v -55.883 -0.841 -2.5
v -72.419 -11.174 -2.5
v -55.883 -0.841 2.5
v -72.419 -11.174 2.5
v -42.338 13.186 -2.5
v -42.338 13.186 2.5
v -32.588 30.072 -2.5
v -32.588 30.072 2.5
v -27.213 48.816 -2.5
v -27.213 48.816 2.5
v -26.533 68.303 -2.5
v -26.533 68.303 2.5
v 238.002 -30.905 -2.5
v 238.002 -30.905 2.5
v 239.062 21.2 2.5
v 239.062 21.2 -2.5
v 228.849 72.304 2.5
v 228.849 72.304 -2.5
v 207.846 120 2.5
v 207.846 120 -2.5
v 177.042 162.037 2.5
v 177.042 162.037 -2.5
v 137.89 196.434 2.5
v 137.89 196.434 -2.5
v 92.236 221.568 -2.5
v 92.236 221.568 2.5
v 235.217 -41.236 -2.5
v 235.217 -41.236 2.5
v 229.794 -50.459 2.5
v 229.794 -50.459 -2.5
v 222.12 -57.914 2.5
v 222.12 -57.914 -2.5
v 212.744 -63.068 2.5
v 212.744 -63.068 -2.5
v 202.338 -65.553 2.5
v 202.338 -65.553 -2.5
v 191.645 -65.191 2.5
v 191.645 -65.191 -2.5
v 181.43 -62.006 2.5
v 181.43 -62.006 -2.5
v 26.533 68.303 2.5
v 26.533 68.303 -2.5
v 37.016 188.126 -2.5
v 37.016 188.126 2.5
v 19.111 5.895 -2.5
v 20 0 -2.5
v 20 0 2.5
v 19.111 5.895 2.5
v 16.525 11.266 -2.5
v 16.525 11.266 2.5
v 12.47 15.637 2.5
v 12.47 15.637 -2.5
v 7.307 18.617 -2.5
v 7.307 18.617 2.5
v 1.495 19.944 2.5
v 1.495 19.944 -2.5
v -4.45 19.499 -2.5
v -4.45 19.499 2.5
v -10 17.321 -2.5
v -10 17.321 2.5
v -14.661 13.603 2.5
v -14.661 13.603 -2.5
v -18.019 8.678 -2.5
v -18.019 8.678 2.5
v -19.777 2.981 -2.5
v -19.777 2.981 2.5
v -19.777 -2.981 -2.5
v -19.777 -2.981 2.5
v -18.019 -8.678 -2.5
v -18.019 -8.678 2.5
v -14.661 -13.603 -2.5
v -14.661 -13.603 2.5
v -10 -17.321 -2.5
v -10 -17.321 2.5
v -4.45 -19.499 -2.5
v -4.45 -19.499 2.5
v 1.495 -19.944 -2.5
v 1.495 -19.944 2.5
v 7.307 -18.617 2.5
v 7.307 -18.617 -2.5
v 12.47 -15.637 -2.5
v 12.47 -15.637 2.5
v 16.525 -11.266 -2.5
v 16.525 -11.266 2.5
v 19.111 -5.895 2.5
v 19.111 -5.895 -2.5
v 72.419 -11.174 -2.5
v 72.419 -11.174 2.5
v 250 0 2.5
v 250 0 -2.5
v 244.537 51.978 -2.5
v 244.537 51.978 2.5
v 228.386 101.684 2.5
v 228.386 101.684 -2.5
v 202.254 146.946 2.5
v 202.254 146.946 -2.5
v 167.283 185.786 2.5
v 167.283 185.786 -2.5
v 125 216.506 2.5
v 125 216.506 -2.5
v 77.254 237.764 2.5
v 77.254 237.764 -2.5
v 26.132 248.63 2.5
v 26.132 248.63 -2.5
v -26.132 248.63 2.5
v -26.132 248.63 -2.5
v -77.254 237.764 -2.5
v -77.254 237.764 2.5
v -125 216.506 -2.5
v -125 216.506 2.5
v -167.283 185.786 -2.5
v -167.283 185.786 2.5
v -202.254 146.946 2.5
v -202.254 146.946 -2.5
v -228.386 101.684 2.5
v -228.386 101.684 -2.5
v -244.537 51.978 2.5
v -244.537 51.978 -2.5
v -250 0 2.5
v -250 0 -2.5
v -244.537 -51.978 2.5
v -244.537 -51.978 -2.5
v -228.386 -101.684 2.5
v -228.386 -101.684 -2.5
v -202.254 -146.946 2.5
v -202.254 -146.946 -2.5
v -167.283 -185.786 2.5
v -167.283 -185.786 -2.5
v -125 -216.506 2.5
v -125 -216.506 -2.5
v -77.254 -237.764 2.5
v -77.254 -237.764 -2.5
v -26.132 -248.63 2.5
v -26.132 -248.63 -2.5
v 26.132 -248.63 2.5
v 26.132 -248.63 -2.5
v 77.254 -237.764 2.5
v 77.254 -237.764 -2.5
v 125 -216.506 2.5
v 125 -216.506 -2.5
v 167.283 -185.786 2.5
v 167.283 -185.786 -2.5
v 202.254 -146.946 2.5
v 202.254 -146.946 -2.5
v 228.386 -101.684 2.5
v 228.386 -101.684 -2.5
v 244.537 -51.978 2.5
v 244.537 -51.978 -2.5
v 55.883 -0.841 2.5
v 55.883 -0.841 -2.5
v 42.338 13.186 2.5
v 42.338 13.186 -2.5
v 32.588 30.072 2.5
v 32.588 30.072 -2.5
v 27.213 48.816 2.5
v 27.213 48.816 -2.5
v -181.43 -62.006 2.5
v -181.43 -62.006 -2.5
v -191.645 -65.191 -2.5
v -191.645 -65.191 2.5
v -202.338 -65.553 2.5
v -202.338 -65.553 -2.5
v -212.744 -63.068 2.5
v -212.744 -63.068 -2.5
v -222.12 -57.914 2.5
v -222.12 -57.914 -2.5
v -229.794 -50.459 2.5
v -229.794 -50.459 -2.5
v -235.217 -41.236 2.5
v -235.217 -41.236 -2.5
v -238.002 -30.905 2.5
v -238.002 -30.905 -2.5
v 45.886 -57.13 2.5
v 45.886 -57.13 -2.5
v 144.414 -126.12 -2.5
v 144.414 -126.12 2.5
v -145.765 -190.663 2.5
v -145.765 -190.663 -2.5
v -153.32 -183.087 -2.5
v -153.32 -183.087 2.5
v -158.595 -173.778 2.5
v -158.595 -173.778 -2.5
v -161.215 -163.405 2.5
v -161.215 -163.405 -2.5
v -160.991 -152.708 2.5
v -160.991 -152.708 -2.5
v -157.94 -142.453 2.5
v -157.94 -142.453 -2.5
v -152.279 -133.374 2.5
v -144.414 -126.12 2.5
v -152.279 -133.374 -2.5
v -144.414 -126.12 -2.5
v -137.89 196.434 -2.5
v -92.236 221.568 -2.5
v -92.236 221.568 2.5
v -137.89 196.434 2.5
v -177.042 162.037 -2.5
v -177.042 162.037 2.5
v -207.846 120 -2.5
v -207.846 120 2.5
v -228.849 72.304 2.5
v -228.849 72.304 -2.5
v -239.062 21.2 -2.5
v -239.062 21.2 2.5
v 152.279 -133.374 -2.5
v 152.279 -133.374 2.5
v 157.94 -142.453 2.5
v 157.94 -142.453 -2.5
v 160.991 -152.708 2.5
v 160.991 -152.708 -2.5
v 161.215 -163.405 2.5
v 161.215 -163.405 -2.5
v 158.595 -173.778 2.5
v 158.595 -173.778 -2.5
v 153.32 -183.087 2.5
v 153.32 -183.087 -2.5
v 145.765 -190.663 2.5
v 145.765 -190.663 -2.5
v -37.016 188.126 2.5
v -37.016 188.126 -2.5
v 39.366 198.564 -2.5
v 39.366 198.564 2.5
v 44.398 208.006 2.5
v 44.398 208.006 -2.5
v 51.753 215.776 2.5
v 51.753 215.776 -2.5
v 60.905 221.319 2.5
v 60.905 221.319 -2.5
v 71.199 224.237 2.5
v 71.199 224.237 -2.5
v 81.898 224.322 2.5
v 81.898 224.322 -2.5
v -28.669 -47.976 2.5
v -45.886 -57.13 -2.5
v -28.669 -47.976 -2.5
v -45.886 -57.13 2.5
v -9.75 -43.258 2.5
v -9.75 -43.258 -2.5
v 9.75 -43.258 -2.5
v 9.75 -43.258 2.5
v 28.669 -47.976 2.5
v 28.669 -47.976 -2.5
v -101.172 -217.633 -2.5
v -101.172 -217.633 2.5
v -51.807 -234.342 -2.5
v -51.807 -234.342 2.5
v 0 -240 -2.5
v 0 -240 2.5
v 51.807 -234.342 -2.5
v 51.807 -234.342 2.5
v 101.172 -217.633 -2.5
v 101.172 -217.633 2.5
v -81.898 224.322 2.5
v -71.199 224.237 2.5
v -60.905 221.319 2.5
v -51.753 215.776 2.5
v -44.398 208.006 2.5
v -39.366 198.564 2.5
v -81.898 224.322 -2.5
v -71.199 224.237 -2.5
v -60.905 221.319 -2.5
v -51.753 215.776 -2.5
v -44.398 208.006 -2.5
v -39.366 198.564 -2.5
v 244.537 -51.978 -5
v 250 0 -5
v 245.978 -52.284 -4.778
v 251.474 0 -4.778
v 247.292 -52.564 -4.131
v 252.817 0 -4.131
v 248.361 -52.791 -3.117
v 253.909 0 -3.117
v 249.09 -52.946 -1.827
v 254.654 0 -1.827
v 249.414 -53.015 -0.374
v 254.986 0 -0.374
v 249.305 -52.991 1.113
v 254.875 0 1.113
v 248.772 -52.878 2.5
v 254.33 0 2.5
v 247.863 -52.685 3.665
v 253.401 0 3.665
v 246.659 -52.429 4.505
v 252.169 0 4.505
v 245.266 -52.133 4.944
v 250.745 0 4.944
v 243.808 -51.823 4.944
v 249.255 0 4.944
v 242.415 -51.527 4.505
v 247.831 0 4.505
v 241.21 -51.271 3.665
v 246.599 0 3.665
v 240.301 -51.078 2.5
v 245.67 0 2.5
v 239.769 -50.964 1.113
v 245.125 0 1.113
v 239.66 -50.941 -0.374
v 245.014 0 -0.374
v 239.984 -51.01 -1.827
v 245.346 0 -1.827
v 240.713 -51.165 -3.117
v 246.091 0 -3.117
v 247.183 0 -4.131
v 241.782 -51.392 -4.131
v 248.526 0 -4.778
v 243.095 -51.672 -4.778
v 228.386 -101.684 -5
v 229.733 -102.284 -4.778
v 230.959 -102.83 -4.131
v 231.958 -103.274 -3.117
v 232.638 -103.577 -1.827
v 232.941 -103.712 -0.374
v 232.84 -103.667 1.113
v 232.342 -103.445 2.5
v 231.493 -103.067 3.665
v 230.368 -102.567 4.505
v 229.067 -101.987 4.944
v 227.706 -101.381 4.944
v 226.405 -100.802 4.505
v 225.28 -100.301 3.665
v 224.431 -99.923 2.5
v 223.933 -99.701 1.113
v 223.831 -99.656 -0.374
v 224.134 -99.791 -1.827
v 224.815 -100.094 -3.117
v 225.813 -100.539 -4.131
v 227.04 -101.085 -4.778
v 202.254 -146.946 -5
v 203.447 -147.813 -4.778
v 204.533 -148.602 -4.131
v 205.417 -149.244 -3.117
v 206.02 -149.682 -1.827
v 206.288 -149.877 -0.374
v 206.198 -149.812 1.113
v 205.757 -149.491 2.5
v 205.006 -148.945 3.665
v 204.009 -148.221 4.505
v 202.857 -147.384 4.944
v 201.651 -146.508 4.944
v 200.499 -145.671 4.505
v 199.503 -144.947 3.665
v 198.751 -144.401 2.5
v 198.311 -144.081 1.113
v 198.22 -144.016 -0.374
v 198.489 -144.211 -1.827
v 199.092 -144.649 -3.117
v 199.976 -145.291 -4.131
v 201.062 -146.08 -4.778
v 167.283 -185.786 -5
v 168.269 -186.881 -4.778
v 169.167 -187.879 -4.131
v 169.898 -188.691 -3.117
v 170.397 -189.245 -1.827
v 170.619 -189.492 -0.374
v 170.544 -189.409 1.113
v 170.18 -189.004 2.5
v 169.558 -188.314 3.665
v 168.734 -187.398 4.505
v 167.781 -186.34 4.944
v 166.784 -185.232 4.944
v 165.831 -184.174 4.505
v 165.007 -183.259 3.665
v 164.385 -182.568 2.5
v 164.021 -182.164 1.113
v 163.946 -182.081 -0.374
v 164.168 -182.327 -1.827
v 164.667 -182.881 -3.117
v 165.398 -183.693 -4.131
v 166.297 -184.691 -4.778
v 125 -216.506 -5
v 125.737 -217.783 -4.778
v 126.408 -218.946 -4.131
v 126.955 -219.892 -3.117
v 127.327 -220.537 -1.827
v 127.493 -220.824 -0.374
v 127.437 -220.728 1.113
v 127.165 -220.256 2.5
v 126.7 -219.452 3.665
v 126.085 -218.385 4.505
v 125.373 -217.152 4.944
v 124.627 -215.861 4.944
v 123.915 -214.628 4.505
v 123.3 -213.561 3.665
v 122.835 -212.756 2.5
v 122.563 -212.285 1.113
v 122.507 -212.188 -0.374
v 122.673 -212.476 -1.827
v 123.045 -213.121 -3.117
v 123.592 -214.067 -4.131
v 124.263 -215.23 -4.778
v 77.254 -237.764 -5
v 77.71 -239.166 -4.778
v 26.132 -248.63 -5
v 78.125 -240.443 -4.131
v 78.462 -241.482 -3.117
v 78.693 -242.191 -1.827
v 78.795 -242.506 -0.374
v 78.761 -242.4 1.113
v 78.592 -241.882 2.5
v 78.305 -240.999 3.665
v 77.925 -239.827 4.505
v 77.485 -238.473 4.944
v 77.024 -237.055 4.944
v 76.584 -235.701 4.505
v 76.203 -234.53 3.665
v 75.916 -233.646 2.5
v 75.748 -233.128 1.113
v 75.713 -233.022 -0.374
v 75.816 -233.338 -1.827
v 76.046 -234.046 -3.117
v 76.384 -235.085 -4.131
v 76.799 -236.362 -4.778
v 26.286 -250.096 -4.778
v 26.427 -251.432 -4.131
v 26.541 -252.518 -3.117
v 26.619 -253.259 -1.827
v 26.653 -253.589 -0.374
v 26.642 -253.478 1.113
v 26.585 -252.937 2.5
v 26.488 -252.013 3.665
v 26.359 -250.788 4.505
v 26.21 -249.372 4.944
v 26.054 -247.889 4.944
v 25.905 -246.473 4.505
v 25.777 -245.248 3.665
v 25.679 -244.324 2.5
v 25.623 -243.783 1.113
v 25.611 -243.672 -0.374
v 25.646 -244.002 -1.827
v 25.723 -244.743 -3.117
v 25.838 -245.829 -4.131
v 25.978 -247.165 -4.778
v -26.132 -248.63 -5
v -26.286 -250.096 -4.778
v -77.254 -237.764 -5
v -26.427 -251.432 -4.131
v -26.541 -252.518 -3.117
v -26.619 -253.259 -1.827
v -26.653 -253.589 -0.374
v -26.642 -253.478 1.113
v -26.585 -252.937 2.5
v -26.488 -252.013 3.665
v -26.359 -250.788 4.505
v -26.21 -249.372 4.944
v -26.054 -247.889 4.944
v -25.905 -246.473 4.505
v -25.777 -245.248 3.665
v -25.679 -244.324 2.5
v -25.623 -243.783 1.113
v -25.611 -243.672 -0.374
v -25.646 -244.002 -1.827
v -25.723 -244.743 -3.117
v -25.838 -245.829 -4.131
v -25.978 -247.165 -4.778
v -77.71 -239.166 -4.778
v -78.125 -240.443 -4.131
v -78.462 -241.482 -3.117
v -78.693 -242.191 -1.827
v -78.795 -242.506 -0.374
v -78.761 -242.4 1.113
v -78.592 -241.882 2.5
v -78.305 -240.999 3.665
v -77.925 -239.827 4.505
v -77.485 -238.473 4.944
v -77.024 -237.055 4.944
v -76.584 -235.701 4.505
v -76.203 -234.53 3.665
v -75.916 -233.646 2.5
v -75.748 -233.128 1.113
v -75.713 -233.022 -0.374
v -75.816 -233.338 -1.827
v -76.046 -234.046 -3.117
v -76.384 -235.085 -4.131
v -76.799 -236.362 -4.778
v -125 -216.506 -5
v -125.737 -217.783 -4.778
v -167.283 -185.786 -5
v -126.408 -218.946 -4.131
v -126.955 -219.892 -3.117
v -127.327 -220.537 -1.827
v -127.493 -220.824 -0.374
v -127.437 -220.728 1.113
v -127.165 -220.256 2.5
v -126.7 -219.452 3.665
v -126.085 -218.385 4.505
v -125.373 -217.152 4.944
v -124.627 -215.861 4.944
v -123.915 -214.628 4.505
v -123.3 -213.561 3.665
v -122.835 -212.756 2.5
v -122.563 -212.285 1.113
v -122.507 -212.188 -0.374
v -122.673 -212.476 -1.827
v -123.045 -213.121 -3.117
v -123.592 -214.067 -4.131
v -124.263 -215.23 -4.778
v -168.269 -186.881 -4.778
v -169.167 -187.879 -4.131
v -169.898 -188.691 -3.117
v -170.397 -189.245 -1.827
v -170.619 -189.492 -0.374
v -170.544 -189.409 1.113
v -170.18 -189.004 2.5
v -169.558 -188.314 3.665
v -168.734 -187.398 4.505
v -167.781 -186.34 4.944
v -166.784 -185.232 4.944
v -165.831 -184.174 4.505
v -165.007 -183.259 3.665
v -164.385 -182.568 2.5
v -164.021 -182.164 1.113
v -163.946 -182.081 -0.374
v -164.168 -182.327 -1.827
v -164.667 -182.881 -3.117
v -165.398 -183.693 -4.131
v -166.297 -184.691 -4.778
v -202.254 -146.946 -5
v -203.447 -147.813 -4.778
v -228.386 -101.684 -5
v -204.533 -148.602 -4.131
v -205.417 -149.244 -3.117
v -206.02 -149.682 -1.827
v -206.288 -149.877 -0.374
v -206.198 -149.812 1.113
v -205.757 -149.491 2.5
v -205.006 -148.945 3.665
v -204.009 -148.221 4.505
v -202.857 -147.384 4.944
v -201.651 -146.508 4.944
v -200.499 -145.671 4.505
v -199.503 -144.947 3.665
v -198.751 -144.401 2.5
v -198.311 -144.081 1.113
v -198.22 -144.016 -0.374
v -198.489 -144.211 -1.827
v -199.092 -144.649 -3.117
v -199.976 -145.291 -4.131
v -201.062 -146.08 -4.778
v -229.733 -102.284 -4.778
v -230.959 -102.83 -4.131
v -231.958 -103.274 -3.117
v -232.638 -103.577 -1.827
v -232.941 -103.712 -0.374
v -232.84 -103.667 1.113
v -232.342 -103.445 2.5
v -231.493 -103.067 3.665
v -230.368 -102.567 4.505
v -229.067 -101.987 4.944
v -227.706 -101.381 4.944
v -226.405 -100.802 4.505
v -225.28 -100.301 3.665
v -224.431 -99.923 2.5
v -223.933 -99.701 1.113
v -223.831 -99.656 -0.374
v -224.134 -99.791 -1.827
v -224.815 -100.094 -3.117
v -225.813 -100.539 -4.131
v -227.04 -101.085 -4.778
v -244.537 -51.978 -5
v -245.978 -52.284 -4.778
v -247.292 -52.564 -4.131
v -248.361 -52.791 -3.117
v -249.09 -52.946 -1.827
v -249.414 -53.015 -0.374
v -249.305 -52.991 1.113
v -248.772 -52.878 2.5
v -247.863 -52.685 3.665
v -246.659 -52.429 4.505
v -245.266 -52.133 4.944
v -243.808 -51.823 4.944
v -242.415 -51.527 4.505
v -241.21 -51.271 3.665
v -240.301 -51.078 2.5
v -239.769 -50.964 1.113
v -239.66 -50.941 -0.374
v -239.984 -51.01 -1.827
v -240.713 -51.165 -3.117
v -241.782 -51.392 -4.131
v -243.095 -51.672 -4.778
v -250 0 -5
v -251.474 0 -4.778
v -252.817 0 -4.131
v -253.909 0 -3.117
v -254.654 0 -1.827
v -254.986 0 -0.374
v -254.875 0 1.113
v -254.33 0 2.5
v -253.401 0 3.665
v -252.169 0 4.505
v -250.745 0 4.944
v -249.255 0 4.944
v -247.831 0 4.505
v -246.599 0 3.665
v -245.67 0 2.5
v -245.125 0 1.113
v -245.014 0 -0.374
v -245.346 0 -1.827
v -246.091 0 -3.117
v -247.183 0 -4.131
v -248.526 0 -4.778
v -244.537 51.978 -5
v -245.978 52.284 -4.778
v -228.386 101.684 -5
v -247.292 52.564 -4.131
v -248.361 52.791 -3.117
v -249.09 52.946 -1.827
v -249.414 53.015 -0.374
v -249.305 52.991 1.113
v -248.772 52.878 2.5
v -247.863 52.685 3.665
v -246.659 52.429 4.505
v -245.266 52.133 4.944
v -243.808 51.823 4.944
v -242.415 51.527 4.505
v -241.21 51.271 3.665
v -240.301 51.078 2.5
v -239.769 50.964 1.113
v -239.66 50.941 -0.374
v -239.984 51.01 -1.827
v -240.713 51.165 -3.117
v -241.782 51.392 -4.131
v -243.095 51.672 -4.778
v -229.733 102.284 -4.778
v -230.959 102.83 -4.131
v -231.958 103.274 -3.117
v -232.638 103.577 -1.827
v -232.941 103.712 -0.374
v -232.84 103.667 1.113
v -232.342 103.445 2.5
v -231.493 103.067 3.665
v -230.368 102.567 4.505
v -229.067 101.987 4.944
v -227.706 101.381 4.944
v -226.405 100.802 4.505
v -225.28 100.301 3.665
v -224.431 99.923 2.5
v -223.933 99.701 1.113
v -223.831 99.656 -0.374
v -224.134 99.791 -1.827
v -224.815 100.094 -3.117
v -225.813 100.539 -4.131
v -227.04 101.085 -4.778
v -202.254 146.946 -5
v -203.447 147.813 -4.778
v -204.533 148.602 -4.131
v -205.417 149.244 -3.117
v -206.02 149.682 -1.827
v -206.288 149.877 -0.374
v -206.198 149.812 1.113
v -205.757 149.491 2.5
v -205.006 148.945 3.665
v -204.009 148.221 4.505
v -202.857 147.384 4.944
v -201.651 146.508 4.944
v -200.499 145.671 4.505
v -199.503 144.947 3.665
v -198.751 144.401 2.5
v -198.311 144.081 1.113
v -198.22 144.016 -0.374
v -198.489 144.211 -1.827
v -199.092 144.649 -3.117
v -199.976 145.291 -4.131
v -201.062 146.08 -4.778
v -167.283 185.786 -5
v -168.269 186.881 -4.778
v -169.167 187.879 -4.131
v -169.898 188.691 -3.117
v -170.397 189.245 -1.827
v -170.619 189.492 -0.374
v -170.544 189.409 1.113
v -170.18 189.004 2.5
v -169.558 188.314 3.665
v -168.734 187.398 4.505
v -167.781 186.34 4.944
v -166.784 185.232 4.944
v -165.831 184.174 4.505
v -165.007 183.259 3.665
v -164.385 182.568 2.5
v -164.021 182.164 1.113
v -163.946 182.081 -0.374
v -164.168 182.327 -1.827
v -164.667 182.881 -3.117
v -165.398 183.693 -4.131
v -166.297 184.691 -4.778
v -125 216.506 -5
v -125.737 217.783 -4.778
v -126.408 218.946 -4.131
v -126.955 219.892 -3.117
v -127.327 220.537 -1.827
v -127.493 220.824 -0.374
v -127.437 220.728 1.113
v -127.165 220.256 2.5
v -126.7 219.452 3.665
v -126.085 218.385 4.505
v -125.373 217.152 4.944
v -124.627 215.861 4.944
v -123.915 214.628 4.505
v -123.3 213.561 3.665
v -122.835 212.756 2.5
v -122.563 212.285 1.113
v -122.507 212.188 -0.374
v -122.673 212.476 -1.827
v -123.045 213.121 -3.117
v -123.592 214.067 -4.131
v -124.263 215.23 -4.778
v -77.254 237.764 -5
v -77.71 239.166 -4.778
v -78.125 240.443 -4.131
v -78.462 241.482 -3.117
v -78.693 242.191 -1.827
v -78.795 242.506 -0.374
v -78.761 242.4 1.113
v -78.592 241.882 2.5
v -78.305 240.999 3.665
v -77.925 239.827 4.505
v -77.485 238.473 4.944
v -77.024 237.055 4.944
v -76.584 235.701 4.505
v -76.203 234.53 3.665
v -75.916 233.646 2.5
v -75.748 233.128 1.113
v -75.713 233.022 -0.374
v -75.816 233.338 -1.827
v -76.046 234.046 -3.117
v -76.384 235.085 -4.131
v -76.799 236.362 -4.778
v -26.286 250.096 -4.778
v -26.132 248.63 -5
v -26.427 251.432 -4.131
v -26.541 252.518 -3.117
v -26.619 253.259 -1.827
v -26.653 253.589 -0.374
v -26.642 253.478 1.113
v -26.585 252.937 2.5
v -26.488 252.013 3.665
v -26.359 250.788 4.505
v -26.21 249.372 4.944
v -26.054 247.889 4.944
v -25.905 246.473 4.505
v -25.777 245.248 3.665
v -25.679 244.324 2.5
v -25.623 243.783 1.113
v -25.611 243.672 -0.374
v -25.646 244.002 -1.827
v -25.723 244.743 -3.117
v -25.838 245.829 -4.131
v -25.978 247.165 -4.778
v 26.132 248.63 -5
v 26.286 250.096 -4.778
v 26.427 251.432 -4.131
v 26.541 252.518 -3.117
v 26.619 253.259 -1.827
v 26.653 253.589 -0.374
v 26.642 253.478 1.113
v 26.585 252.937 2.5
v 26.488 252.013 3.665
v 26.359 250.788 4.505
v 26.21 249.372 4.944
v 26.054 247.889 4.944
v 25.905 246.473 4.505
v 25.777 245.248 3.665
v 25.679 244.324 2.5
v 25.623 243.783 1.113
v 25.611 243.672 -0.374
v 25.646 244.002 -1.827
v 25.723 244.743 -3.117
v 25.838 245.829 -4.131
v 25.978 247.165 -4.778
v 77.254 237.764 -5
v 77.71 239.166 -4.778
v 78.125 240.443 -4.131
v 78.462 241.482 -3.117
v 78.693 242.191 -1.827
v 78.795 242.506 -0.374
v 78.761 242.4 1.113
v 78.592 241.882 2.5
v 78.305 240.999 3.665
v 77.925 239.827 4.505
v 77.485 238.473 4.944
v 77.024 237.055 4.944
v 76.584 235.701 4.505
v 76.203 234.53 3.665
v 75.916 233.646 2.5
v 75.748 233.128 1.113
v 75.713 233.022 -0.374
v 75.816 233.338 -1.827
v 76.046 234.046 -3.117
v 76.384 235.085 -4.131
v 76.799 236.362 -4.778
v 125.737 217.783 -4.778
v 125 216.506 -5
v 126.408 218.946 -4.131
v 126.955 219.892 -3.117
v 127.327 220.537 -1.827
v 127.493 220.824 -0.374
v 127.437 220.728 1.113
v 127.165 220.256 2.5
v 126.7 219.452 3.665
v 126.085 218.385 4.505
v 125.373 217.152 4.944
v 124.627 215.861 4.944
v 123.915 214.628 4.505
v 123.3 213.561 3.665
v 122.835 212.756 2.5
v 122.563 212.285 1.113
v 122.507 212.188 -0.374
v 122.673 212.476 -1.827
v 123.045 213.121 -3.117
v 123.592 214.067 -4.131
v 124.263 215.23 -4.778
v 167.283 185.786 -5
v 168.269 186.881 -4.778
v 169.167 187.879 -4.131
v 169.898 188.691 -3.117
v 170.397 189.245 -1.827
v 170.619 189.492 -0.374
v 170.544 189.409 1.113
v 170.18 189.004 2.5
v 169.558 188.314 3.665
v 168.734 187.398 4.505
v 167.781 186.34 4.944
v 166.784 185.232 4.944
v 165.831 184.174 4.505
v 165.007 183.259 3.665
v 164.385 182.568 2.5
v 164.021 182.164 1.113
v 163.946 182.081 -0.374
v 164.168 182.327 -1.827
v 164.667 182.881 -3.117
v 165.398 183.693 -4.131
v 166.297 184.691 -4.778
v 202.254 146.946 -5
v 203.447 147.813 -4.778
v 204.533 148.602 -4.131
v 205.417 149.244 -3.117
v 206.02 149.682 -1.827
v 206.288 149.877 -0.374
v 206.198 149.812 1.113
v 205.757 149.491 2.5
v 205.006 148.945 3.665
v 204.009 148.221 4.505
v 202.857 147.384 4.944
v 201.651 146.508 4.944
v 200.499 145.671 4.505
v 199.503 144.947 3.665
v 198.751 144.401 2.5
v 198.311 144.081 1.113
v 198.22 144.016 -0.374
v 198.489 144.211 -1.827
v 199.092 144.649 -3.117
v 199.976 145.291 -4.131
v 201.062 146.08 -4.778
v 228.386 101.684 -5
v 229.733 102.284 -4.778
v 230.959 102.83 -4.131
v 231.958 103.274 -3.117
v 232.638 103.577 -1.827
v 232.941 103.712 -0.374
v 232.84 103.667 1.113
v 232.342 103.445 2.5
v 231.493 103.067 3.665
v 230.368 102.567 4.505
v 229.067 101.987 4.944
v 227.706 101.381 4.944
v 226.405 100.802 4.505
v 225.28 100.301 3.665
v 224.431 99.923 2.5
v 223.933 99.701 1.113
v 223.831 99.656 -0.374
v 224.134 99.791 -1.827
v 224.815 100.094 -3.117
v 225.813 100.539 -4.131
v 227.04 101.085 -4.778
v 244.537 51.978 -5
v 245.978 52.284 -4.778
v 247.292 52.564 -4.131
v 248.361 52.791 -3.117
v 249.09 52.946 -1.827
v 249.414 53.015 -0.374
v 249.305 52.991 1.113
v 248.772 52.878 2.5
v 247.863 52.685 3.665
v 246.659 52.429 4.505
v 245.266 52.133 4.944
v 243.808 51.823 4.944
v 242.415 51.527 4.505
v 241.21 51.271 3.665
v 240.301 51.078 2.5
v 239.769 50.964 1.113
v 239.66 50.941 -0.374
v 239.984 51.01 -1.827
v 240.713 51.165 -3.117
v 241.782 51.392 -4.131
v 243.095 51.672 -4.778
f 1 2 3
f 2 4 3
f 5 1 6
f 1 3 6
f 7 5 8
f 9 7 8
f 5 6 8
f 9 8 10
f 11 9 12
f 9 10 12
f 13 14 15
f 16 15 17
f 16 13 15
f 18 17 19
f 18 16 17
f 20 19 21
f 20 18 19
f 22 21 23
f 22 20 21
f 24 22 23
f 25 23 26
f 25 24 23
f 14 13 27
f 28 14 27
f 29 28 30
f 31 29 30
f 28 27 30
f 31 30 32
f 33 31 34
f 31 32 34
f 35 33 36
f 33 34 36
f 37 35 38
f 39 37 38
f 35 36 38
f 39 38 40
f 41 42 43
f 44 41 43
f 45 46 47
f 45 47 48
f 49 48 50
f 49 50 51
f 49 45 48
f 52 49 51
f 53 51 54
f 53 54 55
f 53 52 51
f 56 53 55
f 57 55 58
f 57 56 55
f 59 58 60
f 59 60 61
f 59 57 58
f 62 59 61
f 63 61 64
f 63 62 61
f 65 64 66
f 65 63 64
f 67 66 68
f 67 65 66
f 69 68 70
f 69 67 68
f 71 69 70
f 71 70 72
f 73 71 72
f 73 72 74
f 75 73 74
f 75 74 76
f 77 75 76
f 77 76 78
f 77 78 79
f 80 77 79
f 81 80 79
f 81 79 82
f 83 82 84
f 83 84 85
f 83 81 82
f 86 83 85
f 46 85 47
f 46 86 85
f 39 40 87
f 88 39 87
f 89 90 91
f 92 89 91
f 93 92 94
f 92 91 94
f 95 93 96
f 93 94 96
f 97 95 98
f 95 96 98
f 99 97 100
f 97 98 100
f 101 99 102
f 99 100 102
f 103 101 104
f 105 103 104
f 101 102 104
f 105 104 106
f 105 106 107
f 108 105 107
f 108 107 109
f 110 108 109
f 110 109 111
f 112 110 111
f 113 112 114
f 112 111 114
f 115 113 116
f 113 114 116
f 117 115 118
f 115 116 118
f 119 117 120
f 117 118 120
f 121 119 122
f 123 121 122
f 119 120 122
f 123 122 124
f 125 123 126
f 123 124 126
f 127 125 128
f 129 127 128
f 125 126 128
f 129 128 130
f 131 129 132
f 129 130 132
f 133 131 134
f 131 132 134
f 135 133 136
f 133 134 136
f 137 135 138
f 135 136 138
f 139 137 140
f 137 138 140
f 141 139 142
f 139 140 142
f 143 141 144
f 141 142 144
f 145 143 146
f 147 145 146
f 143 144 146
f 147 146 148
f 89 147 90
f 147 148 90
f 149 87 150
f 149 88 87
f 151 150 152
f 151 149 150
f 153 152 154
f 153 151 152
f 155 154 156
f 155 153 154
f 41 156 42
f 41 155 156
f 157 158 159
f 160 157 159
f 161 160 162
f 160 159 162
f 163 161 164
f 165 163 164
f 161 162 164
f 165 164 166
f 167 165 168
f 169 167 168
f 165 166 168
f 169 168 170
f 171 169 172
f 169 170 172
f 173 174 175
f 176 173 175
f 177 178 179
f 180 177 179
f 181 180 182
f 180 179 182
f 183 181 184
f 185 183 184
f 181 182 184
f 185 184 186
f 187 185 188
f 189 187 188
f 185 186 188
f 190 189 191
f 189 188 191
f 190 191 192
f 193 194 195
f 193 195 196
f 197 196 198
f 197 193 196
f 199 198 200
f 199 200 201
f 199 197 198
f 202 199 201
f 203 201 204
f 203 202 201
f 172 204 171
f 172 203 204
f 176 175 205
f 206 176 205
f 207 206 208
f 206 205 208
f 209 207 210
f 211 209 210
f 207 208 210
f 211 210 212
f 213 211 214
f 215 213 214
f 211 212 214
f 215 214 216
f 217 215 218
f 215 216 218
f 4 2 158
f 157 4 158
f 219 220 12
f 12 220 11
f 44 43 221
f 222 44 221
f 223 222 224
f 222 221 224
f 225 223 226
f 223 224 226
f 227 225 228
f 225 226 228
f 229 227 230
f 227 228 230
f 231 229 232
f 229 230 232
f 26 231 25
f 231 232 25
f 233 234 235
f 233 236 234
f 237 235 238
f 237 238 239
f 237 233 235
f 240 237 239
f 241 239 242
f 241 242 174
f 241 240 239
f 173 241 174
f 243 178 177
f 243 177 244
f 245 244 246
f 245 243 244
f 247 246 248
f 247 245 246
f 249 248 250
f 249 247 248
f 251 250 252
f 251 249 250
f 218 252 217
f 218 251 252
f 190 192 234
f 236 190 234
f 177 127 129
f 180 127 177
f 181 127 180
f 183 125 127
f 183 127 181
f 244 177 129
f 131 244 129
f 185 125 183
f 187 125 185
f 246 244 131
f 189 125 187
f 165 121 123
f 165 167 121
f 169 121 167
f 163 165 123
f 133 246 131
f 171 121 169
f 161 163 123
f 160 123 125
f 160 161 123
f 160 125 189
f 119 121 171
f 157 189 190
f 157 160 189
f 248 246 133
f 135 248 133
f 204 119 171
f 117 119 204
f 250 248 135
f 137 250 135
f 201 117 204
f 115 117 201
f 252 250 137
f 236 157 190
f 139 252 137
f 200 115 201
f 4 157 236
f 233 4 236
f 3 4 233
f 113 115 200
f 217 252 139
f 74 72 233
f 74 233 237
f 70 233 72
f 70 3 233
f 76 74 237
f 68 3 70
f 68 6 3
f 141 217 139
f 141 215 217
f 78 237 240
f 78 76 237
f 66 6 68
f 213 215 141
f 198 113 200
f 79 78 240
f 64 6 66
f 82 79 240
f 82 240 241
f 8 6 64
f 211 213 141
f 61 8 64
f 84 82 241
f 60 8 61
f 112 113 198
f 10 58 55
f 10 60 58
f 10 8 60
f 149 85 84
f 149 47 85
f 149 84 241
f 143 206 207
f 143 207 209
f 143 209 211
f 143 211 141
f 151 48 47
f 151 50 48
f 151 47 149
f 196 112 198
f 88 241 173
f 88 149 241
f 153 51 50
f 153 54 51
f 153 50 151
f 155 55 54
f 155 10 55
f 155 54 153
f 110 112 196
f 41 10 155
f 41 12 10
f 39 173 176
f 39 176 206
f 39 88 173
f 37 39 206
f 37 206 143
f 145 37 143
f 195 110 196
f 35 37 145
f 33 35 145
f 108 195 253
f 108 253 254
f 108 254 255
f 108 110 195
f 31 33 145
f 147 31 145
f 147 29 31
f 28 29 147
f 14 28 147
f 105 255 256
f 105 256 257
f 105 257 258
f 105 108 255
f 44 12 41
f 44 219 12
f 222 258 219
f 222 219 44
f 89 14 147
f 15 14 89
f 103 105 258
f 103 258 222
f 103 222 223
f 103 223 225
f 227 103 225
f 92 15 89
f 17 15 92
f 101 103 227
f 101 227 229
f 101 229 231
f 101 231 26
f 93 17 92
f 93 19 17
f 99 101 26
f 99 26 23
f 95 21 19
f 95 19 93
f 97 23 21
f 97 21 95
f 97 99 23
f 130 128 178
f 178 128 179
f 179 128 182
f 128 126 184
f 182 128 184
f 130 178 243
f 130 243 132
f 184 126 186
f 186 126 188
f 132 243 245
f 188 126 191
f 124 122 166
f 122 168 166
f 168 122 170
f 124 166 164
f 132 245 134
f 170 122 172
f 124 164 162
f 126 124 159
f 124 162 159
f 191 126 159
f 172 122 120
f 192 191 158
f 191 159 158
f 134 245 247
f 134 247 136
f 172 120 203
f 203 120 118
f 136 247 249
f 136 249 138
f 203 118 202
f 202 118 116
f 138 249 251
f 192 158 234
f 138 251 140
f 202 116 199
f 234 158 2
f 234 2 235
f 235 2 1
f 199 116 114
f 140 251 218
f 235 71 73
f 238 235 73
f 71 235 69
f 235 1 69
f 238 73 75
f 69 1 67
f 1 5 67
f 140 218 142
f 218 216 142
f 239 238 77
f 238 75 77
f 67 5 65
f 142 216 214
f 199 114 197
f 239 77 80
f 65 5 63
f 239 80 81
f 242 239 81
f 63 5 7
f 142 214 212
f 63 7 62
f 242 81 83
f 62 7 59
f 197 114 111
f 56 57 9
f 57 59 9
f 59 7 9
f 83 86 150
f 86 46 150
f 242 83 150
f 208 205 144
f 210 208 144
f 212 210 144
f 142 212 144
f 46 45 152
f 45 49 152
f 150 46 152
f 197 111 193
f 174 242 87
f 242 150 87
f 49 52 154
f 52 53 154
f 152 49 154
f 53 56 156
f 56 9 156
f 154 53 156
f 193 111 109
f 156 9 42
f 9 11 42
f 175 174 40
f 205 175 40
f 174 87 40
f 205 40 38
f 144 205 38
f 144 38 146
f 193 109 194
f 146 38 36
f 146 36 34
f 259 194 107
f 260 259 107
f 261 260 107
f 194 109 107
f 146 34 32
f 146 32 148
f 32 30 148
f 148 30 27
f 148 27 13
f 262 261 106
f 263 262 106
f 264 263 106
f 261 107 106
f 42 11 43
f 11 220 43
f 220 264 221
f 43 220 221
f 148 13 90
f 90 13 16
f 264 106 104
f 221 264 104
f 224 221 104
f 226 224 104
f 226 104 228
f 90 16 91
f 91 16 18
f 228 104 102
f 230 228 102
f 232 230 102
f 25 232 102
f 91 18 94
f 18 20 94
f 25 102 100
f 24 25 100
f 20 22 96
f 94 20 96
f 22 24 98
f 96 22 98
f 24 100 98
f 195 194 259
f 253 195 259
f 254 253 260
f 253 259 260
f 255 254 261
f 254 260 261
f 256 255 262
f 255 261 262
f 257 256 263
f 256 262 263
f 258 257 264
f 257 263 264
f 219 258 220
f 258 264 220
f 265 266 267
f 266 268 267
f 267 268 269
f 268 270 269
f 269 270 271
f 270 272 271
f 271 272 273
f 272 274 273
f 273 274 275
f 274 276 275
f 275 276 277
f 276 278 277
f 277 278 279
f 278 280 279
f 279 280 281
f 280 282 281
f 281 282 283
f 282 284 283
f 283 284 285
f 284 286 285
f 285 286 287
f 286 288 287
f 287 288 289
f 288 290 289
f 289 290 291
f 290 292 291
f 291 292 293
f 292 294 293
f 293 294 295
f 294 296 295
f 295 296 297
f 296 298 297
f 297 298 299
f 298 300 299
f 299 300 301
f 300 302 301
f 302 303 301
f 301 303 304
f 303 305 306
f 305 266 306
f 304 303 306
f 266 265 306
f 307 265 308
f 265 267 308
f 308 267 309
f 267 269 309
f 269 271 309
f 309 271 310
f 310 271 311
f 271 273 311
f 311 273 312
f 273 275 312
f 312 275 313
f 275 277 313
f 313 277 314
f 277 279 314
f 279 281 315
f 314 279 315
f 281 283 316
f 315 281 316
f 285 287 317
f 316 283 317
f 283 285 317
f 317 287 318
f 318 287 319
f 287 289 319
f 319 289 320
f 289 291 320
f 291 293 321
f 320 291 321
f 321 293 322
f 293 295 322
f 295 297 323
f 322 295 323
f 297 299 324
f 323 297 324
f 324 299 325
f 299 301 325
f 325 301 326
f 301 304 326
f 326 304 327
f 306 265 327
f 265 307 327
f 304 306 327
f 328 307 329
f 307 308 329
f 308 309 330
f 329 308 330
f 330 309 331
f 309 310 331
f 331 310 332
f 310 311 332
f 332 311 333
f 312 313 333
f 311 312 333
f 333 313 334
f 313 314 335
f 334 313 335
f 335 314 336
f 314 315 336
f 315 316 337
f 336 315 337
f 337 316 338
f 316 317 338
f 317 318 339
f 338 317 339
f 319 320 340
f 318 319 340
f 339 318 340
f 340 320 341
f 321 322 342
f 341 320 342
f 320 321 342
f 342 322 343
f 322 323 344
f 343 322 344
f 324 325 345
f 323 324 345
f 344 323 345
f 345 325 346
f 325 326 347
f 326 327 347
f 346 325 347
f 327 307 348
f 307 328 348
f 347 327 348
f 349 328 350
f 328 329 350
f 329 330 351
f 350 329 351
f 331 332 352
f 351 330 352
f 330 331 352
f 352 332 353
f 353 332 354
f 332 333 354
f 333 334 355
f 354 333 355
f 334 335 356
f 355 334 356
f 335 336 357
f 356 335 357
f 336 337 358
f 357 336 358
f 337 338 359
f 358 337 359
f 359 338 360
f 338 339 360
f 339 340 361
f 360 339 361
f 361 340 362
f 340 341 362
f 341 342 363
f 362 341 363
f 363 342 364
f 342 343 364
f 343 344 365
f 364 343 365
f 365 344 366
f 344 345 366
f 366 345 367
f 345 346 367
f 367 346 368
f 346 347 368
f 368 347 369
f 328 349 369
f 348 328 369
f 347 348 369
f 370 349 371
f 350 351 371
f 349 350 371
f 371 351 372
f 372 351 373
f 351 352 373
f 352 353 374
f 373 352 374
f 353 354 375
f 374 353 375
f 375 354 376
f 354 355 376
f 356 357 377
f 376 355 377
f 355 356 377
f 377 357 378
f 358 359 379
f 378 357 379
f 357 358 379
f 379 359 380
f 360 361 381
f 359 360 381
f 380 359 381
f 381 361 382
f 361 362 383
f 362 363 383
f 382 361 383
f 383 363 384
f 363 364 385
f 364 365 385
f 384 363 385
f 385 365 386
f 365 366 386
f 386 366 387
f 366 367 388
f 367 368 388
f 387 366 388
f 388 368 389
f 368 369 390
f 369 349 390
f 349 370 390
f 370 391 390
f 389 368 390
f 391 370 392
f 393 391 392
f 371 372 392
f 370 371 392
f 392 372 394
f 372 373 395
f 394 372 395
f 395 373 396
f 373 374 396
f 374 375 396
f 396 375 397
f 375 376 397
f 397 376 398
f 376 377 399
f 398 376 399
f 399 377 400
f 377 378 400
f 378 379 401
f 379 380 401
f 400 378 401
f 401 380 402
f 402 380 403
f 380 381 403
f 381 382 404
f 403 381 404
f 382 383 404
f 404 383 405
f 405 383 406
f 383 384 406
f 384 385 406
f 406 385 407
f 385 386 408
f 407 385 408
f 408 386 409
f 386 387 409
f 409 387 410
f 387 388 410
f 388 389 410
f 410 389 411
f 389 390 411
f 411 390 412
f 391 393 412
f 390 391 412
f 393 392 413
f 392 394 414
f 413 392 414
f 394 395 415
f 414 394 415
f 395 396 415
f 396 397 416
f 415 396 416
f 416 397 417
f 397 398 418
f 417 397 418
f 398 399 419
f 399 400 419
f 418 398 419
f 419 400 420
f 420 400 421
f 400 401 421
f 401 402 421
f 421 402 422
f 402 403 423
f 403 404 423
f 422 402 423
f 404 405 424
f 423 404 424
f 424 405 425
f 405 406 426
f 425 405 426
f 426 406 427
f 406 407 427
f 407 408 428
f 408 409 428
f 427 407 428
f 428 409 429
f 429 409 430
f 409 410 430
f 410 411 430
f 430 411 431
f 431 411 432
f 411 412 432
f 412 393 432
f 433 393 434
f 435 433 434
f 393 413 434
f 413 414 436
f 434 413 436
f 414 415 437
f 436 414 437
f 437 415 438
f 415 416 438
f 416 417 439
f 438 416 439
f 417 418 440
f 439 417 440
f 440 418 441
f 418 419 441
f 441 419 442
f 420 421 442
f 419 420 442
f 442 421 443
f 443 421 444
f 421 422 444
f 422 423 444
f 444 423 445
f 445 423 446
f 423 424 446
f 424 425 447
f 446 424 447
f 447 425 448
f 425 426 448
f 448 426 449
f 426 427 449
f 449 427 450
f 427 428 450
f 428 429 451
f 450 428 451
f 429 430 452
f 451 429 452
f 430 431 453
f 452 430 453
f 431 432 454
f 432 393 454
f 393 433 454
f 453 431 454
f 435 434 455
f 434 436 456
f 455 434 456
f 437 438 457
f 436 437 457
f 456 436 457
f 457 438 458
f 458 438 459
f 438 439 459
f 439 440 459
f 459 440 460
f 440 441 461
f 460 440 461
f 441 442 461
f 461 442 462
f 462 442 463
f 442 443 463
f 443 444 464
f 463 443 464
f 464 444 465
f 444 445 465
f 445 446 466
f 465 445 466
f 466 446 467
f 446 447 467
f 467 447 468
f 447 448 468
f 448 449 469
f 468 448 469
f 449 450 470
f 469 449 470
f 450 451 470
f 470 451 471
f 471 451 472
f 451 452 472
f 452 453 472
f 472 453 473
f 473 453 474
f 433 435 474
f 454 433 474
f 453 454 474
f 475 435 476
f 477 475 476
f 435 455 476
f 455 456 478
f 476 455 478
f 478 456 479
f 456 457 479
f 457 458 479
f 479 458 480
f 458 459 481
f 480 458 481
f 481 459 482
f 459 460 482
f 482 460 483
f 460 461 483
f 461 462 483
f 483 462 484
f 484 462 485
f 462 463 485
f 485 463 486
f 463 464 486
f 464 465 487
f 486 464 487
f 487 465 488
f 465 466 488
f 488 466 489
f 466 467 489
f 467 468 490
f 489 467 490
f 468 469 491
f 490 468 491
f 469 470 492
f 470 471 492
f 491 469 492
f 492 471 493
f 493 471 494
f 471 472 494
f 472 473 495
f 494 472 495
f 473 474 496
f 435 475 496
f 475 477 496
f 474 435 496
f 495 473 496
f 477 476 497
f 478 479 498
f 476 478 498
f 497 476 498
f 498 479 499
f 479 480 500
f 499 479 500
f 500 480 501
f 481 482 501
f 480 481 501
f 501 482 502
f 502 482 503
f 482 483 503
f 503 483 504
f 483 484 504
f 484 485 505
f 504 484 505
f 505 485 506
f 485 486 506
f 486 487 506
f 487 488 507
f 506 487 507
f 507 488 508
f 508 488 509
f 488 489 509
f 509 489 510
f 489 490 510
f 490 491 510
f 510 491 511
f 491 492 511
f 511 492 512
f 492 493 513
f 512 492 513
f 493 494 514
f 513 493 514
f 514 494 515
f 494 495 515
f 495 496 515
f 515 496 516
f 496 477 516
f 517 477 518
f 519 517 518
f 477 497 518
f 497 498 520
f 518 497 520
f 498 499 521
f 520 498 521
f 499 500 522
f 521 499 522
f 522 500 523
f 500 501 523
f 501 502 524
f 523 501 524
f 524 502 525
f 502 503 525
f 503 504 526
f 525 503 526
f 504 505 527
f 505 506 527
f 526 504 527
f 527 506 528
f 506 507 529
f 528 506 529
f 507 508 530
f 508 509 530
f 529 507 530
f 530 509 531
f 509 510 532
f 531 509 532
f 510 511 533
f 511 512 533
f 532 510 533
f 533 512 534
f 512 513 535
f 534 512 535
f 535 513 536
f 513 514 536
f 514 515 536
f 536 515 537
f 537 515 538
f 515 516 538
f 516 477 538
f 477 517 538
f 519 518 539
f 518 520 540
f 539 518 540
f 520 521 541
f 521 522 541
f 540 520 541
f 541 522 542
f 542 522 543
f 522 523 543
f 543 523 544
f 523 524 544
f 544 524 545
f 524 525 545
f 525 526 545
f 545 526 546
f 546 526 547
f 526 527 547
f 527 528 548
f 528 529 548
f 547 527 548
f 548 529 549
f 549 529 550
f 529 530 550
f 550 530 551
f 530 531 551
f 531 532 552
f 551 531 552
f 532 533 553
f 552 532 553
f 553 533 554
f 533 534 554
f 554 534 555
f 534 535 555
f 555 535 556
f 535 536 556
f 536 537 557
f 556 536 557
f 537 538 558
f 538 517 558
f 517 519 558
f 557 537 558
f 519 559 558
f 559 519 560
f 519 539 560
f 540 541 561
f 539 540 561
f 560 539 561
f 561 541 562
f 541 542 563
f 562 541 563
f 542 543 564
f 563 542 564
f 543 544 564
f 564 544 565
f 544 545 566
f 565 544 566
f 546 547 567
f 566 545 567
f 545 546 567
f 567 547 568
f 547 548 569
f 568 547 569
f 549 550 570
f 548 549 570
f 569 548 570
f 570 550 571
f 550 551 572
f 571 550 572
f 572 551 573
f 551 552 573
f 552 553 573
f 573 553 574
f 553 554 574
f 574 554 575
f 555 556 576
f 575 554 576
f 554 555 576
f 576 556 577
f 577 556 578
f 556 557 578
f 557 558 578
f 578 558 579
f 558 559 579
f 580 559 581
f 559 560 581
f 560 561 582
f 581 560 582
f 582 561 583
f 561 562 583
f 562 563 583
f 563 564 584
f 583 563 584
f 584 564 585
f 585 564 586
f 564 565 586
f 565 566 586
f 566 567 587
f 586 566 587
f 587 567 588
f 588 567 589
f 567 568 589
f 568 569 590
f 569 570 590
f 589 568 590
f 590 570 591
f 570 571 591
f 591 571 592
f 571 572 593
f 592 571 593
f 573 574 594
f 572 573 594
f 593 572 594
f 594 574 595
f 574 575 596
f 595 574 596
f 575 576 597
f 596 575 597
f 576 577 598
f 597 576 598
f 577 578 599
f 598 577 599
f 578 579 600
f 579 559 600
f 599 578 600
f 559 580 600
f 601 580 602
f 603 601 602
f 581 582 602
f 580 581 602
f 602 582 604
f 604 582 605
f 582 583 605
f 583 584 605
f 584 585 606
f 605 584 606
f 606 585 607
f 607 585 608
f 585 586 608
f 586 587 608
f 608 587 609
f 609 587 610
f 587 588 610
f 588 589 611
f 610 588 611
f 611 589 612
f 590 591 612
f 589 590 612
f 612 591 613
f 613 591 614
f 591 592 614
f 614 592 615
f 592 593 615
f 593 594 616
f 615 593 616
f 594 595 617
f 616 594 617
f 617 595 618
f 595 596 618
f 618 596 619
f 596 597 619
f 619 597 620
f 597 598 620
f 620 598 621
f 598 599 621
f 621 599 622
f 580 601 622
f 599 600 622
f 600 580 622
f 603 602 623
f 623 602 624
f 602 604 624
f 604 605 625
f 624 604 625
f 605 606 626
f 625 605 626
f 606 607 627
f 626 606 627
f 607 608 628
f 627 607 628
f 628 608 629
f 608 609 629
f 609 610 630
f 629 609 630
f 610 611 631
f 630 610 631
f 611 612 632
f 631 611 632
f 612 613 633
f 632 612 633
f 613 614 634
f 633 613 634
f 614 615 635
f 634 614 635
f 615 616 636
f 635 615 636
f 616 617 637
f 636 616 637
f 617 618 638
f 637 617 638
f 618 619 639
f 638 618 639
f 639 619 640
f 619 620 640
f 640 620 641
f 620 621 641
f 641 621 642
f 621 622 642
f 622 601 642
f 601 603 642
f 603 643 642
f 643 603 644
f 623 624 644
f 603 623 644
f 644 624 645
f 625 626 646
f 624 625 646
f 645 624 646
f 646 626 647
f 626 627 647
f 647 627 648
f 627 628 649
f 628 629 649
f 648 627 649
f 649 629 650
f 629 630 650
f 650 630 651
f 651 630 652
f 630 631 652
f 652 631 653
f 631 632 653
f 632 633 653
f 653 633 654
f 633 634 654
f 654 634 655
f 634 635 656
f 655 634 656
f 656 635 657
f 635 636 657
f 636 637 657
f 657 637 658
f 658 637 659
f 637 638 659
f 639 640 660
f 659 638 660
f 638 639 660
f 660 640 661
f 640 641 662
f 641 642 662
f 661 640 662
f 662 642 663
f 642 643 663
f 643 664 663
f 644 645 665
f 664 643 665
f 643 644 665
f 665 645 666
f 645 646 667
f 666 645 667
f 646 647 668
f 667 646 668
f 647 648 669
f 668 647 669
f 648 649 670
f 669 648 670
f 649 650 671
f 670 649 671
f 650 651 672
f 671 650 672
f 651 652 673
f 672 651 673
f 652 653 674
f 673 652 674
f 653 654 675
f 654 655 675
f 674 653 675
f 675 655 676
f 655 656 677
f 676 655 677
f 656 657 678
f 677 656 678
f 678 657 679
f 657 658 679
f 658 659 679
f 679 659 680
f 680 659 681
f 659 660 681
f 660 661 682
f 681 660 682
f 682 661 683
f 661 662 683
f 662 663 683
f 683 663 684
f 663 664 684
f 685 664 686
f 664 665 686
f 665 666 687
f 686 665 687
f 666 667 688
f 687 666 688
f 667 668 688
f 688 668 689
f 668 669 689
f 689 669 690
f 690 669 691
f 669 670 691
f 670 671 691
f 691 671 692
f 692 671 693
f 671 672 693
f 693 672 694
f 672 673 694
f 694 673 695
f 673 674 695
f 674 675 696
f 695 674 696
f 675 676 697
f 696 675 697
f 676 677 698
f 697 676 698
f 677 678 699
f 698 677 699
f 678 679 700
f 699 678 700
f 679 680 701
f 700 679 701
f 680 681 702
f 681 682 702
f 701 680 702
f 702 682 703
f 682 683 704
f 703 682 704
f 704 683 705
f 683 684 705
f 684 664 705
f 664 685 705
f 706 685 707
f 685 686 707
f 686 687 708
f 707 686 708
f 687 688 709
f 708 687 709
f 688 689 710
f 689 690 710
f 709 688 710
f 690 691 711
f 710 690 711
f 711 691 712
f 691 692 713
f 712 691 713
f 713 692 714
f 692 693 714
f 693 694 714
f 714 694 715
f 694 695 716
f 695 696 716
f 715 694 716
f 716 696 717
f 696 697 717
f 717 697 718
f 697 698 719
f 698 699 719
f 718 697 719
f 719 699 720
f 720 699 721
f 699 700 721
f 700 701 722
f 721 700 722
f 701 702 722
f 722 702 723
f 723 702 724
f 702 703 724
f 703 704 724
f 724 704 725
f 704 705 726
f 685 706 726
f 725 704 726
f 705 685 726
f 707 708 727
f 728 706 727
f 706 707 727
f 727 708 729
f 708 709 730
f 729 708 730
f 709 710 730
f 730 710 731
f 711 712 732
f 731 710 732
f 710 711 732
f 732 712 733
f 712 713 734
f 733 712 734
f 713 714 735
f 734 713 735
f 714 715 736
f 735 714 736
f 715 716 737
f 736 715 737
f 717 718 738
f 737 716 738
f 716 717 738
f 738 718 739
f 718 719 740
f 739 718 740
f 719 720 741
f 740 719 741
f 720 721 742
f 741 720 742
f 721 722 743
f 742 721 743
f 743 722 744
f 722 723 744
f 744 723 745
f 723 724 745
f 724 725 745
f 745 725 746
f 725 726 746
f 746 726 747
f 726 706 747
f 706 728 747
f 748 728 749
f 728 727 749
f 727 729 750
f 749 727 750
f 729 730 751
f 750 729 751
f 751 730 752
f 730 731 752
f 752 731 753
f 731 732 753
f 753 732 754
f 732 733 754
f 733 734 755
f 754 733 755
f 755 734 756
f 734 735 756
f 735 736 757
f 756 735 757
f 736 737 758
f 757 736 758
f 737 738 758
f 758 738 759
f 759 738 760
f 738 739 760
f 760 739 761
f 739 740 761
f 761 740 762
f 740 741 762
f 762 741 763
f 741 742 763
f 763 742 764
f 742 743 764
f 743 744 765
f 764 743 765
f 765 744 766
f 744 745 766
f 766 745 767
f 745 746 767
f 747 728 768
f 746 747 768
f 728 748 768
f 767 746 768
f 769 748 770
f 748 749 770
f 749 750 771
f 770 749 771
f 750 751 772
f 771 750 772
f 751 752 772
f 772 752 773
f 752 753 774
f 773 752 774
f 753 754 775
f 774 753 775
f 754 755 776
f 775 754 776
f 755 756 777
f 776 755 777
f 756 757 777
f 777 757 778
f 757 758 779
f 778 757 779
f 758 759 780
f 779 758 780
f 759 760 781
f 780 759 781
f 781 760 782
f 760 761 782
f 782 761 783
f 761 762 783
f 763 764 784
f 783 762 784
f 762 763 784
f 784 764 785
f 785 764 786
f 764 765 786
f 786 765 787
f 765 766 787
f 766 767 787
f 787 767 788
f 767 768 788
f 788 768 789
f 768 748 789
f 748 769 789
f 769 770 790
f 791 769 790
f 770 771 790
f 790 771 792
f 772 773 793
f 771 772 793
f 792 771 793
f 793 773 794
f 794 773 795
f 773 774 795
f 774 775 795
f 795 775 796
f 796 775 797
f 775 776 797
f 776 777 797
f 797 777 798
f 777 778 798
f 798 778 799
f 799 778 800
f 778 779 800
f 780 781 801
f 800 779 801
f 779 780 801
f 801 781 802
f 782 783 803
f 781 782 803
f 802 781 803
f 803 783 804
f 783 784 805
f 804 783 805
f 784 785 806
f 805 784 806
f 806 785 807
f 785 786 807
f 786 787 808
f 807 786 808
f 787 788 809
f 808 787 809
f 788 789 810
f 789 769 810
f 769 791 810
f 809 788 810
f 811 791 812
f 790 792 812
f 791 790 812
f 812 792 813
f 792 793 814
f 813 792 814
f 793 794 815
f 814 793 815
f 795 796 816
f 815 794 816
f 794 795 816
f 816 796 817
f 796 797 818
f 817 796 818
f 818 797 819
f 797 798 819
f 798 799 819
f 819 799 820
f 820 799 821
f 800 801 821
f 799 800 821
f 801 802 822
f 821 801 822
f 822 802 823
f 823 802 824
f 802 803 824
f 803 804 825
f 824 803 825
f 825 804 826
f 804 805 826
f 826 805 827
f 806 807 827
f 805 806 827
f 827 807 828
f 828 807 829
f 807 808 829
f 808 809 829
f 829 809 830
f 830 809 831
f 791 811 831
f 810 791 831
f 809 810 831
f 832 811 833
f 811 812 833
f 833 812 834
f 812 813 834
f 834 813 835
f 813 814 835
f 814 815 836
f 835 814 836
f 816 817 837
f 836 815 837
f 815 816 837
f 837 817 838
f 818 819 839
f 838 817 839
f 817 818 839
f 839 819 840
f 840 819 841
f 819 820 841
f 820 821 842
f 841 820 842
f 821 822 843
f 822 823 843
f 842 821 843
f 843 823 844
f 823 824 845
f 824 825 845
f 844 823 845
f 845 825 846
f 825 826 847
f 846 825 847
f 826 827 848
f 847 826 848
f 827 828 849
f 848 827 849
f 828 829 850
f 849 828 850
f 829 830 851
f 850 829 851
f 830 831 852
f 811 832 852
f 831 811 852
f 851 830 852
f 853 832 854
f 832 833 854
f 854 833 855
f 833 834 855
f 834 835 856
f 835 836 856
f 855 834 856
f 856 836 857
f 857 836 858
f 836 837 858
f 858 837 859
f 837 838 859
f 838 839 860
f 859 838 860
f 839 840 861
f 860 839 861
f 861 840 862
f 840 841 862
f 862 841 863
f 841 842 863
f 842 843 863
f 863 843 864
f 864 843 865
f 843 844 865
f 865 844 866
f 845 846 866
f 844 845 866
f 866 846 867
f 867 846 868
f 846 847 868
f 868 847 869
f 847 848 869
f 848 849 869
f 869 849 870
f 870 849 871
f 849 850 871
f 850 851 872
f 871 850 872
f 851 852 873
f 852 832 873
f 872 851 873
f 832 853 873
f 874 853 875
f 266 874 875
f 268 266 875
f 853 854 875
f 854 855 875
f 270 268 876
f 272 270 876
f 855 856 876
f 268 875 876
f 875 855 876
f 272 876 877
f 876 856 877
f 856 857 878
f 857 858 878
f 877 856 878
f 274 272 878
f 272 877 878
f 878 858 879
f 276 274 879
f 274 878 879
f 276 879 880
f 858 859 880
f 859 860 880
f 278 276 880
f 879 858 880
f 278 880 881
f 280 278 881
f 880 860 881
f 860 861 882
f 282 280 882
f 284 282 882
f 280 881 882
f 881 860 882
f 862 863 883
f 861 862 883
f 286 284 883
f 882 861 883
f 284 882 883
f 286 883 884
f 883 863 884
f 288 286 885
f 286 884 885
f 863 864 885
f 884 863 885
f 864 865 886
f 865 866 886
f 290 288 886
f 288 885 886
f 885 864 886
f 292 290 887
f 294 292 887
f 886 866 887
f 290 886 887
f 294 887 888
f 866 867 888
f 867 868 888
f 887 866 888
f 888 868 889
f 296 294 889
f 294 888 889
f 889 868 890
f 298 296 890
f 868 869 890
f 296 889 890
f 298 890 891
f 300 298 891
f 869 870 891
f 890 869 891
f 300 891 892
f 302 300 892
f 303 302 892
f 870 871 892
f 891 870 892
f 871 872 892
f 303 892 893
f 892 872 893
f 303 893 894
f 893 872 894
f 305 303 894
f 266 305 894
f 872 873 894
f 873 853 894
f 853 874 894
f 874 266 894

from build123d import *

# Parameters (mm, degrees)
BOSS_EXTRUDE1_DEPTH      = 2.5
BOSS_EXTRUDE1_DEPTH_BACK = 2.5
SKETCH1_R                = 20
BOSS_EXTRUDE2_DEPTH      = 2.5
BOSS_EXTRUDE2_DEPTH_BACK = 2.5
SKETCH1_7_R              = 250
SKETCH1_7_R_2            = 240
SKETCH3_R                = 5
FILLET1_R                = 80
FILLET2_R                = 80
FILLET3_R                = 80


with BuildPart() as part:
    # Sketch1 → Boss-Extrude1 (new, two sides: drawn at the far end of the back side and taken through both)
    with BuildSketch(Plane.XY.offset(-BOSS_EXTRUDE1_DEPTH_BACK)):
        with BuildLine():
            Line((0, -25), (144.414205762, -126.119915499))
            ThreePointArc((144.414205762, -126.119915499), (161.46238624, -158.048806347), (145.76537797, -190.663196725))
            ThreePointArc((145.76537797, -190.663196725), (207.846096908, -120), (238.001860915, -30.904921952))
            ThreePointArc((238.001860915, -30.904921952), (217.605474454, -60.806125066), (181.430153626, -62.006413108))
            Line((181.430153626, -62.006413108), (21.650635095, 12.5))
            Line((21.650635095, 12.5), (37.015947864, 188.126328607))
            ThreePointArc((37.015947864, 188.126328607), (56.143088214, 218.854931413), (92.236482946, 221.568118676))
            ThreePointArc((92.236482946, 221.568118676), (0, 240), (-92.236482946, 221.568118676))
            ThreePointArc((-92.236482946, 221.568118676), (-56.143088214, 218.854931413), (-37.015947864, 188.126328607))
            Line((-37.015947864, 188.126328607), (-21.650635095, 12.5))
            Line((-21.650635095, 12.5), (-181.430153626, -62.006413108))
            ThreePointArc((-181.430153626, -62.006413108), (-217.605474454, -60.806125066), (-238.001860915, -30.904921952))
            ThreePointArc((-238.001860915, -30.904921952), (-207.846096908, -120), (-145.76537797, -190.663196725))
            ThreePointArc((-145.76537797, -190.663196725), (-161.46238624, -158.048806347), (-144.414205762, -126.119915499))
            Line((-144.414205762, -126.119915499), (0, -25))
        make_face()
        Circle(SKETCH1_R, mode=Mode.SUBTRACT)
    extrude(amount=BOSS_EXTRUDE1_DEPTH + BOSS_EXTRUDE1_DEPTH_BACK)

    # Sketch1<7> → Boss-Extrude2 (add, two sides: drawn at the far end of the back side and taken through both)
    with BuildSketch(Plane.XY.offset(-BOSS_EXTRUDE2_DEPTH_BACK)):
        Circle(SKETCH1_7_R)
        Circle(SKETCH1_7_R_2, mode=Mode.SUBTRACT)
    extrude(amount=BOSS_EXTRUDE2_DEPTH + BOSS_EXTRUDE2_DEPTH_BACK)

    # Fillet1
    fillet1_edges = [part.edges().sort_by_distance(p)[0] for p in [
        (-21.650635095, 12.5, 0),
    ]]
    fillet(fillet1_edges, radius=FILLET1_R)

    # Fillet2
    fillet2_edges = [part.edges().sort_by_distance(p)[0] for p in [
        (21.650635095, 12.5, 0),
    ]]
    fillet(fillet2_edges, radius=FILLET2_R)

    # Fillet3
    fillet3_edges = [part.edges().sort_by_distance(p)[0] for p in [
        (0, -25, 0),
    ]]
    fillet(fillet3_edges, radius=FILLET3_R)


with BuildPart() as body_2:
    # Sketch3 → Revolve1 (revolve)
    with BuildSketch(Plane(origin=(0, 0, 0), x_dir=(0, 0, -1), z_dir=(1, 0, 0)), mode=Mode.PRIVATE) as revolve1_sk:
        with Locations((0, 250)):
            Circle(SKETCH3_R)
    revolve(revolve1_sk.sketch.rotate(Axis((0, 0, 0), (0, 0, -1)), 90), axis=Axis((0, 0, 0), (0, 0, -1)))


solid = Compound([part.part, body_2.part])
